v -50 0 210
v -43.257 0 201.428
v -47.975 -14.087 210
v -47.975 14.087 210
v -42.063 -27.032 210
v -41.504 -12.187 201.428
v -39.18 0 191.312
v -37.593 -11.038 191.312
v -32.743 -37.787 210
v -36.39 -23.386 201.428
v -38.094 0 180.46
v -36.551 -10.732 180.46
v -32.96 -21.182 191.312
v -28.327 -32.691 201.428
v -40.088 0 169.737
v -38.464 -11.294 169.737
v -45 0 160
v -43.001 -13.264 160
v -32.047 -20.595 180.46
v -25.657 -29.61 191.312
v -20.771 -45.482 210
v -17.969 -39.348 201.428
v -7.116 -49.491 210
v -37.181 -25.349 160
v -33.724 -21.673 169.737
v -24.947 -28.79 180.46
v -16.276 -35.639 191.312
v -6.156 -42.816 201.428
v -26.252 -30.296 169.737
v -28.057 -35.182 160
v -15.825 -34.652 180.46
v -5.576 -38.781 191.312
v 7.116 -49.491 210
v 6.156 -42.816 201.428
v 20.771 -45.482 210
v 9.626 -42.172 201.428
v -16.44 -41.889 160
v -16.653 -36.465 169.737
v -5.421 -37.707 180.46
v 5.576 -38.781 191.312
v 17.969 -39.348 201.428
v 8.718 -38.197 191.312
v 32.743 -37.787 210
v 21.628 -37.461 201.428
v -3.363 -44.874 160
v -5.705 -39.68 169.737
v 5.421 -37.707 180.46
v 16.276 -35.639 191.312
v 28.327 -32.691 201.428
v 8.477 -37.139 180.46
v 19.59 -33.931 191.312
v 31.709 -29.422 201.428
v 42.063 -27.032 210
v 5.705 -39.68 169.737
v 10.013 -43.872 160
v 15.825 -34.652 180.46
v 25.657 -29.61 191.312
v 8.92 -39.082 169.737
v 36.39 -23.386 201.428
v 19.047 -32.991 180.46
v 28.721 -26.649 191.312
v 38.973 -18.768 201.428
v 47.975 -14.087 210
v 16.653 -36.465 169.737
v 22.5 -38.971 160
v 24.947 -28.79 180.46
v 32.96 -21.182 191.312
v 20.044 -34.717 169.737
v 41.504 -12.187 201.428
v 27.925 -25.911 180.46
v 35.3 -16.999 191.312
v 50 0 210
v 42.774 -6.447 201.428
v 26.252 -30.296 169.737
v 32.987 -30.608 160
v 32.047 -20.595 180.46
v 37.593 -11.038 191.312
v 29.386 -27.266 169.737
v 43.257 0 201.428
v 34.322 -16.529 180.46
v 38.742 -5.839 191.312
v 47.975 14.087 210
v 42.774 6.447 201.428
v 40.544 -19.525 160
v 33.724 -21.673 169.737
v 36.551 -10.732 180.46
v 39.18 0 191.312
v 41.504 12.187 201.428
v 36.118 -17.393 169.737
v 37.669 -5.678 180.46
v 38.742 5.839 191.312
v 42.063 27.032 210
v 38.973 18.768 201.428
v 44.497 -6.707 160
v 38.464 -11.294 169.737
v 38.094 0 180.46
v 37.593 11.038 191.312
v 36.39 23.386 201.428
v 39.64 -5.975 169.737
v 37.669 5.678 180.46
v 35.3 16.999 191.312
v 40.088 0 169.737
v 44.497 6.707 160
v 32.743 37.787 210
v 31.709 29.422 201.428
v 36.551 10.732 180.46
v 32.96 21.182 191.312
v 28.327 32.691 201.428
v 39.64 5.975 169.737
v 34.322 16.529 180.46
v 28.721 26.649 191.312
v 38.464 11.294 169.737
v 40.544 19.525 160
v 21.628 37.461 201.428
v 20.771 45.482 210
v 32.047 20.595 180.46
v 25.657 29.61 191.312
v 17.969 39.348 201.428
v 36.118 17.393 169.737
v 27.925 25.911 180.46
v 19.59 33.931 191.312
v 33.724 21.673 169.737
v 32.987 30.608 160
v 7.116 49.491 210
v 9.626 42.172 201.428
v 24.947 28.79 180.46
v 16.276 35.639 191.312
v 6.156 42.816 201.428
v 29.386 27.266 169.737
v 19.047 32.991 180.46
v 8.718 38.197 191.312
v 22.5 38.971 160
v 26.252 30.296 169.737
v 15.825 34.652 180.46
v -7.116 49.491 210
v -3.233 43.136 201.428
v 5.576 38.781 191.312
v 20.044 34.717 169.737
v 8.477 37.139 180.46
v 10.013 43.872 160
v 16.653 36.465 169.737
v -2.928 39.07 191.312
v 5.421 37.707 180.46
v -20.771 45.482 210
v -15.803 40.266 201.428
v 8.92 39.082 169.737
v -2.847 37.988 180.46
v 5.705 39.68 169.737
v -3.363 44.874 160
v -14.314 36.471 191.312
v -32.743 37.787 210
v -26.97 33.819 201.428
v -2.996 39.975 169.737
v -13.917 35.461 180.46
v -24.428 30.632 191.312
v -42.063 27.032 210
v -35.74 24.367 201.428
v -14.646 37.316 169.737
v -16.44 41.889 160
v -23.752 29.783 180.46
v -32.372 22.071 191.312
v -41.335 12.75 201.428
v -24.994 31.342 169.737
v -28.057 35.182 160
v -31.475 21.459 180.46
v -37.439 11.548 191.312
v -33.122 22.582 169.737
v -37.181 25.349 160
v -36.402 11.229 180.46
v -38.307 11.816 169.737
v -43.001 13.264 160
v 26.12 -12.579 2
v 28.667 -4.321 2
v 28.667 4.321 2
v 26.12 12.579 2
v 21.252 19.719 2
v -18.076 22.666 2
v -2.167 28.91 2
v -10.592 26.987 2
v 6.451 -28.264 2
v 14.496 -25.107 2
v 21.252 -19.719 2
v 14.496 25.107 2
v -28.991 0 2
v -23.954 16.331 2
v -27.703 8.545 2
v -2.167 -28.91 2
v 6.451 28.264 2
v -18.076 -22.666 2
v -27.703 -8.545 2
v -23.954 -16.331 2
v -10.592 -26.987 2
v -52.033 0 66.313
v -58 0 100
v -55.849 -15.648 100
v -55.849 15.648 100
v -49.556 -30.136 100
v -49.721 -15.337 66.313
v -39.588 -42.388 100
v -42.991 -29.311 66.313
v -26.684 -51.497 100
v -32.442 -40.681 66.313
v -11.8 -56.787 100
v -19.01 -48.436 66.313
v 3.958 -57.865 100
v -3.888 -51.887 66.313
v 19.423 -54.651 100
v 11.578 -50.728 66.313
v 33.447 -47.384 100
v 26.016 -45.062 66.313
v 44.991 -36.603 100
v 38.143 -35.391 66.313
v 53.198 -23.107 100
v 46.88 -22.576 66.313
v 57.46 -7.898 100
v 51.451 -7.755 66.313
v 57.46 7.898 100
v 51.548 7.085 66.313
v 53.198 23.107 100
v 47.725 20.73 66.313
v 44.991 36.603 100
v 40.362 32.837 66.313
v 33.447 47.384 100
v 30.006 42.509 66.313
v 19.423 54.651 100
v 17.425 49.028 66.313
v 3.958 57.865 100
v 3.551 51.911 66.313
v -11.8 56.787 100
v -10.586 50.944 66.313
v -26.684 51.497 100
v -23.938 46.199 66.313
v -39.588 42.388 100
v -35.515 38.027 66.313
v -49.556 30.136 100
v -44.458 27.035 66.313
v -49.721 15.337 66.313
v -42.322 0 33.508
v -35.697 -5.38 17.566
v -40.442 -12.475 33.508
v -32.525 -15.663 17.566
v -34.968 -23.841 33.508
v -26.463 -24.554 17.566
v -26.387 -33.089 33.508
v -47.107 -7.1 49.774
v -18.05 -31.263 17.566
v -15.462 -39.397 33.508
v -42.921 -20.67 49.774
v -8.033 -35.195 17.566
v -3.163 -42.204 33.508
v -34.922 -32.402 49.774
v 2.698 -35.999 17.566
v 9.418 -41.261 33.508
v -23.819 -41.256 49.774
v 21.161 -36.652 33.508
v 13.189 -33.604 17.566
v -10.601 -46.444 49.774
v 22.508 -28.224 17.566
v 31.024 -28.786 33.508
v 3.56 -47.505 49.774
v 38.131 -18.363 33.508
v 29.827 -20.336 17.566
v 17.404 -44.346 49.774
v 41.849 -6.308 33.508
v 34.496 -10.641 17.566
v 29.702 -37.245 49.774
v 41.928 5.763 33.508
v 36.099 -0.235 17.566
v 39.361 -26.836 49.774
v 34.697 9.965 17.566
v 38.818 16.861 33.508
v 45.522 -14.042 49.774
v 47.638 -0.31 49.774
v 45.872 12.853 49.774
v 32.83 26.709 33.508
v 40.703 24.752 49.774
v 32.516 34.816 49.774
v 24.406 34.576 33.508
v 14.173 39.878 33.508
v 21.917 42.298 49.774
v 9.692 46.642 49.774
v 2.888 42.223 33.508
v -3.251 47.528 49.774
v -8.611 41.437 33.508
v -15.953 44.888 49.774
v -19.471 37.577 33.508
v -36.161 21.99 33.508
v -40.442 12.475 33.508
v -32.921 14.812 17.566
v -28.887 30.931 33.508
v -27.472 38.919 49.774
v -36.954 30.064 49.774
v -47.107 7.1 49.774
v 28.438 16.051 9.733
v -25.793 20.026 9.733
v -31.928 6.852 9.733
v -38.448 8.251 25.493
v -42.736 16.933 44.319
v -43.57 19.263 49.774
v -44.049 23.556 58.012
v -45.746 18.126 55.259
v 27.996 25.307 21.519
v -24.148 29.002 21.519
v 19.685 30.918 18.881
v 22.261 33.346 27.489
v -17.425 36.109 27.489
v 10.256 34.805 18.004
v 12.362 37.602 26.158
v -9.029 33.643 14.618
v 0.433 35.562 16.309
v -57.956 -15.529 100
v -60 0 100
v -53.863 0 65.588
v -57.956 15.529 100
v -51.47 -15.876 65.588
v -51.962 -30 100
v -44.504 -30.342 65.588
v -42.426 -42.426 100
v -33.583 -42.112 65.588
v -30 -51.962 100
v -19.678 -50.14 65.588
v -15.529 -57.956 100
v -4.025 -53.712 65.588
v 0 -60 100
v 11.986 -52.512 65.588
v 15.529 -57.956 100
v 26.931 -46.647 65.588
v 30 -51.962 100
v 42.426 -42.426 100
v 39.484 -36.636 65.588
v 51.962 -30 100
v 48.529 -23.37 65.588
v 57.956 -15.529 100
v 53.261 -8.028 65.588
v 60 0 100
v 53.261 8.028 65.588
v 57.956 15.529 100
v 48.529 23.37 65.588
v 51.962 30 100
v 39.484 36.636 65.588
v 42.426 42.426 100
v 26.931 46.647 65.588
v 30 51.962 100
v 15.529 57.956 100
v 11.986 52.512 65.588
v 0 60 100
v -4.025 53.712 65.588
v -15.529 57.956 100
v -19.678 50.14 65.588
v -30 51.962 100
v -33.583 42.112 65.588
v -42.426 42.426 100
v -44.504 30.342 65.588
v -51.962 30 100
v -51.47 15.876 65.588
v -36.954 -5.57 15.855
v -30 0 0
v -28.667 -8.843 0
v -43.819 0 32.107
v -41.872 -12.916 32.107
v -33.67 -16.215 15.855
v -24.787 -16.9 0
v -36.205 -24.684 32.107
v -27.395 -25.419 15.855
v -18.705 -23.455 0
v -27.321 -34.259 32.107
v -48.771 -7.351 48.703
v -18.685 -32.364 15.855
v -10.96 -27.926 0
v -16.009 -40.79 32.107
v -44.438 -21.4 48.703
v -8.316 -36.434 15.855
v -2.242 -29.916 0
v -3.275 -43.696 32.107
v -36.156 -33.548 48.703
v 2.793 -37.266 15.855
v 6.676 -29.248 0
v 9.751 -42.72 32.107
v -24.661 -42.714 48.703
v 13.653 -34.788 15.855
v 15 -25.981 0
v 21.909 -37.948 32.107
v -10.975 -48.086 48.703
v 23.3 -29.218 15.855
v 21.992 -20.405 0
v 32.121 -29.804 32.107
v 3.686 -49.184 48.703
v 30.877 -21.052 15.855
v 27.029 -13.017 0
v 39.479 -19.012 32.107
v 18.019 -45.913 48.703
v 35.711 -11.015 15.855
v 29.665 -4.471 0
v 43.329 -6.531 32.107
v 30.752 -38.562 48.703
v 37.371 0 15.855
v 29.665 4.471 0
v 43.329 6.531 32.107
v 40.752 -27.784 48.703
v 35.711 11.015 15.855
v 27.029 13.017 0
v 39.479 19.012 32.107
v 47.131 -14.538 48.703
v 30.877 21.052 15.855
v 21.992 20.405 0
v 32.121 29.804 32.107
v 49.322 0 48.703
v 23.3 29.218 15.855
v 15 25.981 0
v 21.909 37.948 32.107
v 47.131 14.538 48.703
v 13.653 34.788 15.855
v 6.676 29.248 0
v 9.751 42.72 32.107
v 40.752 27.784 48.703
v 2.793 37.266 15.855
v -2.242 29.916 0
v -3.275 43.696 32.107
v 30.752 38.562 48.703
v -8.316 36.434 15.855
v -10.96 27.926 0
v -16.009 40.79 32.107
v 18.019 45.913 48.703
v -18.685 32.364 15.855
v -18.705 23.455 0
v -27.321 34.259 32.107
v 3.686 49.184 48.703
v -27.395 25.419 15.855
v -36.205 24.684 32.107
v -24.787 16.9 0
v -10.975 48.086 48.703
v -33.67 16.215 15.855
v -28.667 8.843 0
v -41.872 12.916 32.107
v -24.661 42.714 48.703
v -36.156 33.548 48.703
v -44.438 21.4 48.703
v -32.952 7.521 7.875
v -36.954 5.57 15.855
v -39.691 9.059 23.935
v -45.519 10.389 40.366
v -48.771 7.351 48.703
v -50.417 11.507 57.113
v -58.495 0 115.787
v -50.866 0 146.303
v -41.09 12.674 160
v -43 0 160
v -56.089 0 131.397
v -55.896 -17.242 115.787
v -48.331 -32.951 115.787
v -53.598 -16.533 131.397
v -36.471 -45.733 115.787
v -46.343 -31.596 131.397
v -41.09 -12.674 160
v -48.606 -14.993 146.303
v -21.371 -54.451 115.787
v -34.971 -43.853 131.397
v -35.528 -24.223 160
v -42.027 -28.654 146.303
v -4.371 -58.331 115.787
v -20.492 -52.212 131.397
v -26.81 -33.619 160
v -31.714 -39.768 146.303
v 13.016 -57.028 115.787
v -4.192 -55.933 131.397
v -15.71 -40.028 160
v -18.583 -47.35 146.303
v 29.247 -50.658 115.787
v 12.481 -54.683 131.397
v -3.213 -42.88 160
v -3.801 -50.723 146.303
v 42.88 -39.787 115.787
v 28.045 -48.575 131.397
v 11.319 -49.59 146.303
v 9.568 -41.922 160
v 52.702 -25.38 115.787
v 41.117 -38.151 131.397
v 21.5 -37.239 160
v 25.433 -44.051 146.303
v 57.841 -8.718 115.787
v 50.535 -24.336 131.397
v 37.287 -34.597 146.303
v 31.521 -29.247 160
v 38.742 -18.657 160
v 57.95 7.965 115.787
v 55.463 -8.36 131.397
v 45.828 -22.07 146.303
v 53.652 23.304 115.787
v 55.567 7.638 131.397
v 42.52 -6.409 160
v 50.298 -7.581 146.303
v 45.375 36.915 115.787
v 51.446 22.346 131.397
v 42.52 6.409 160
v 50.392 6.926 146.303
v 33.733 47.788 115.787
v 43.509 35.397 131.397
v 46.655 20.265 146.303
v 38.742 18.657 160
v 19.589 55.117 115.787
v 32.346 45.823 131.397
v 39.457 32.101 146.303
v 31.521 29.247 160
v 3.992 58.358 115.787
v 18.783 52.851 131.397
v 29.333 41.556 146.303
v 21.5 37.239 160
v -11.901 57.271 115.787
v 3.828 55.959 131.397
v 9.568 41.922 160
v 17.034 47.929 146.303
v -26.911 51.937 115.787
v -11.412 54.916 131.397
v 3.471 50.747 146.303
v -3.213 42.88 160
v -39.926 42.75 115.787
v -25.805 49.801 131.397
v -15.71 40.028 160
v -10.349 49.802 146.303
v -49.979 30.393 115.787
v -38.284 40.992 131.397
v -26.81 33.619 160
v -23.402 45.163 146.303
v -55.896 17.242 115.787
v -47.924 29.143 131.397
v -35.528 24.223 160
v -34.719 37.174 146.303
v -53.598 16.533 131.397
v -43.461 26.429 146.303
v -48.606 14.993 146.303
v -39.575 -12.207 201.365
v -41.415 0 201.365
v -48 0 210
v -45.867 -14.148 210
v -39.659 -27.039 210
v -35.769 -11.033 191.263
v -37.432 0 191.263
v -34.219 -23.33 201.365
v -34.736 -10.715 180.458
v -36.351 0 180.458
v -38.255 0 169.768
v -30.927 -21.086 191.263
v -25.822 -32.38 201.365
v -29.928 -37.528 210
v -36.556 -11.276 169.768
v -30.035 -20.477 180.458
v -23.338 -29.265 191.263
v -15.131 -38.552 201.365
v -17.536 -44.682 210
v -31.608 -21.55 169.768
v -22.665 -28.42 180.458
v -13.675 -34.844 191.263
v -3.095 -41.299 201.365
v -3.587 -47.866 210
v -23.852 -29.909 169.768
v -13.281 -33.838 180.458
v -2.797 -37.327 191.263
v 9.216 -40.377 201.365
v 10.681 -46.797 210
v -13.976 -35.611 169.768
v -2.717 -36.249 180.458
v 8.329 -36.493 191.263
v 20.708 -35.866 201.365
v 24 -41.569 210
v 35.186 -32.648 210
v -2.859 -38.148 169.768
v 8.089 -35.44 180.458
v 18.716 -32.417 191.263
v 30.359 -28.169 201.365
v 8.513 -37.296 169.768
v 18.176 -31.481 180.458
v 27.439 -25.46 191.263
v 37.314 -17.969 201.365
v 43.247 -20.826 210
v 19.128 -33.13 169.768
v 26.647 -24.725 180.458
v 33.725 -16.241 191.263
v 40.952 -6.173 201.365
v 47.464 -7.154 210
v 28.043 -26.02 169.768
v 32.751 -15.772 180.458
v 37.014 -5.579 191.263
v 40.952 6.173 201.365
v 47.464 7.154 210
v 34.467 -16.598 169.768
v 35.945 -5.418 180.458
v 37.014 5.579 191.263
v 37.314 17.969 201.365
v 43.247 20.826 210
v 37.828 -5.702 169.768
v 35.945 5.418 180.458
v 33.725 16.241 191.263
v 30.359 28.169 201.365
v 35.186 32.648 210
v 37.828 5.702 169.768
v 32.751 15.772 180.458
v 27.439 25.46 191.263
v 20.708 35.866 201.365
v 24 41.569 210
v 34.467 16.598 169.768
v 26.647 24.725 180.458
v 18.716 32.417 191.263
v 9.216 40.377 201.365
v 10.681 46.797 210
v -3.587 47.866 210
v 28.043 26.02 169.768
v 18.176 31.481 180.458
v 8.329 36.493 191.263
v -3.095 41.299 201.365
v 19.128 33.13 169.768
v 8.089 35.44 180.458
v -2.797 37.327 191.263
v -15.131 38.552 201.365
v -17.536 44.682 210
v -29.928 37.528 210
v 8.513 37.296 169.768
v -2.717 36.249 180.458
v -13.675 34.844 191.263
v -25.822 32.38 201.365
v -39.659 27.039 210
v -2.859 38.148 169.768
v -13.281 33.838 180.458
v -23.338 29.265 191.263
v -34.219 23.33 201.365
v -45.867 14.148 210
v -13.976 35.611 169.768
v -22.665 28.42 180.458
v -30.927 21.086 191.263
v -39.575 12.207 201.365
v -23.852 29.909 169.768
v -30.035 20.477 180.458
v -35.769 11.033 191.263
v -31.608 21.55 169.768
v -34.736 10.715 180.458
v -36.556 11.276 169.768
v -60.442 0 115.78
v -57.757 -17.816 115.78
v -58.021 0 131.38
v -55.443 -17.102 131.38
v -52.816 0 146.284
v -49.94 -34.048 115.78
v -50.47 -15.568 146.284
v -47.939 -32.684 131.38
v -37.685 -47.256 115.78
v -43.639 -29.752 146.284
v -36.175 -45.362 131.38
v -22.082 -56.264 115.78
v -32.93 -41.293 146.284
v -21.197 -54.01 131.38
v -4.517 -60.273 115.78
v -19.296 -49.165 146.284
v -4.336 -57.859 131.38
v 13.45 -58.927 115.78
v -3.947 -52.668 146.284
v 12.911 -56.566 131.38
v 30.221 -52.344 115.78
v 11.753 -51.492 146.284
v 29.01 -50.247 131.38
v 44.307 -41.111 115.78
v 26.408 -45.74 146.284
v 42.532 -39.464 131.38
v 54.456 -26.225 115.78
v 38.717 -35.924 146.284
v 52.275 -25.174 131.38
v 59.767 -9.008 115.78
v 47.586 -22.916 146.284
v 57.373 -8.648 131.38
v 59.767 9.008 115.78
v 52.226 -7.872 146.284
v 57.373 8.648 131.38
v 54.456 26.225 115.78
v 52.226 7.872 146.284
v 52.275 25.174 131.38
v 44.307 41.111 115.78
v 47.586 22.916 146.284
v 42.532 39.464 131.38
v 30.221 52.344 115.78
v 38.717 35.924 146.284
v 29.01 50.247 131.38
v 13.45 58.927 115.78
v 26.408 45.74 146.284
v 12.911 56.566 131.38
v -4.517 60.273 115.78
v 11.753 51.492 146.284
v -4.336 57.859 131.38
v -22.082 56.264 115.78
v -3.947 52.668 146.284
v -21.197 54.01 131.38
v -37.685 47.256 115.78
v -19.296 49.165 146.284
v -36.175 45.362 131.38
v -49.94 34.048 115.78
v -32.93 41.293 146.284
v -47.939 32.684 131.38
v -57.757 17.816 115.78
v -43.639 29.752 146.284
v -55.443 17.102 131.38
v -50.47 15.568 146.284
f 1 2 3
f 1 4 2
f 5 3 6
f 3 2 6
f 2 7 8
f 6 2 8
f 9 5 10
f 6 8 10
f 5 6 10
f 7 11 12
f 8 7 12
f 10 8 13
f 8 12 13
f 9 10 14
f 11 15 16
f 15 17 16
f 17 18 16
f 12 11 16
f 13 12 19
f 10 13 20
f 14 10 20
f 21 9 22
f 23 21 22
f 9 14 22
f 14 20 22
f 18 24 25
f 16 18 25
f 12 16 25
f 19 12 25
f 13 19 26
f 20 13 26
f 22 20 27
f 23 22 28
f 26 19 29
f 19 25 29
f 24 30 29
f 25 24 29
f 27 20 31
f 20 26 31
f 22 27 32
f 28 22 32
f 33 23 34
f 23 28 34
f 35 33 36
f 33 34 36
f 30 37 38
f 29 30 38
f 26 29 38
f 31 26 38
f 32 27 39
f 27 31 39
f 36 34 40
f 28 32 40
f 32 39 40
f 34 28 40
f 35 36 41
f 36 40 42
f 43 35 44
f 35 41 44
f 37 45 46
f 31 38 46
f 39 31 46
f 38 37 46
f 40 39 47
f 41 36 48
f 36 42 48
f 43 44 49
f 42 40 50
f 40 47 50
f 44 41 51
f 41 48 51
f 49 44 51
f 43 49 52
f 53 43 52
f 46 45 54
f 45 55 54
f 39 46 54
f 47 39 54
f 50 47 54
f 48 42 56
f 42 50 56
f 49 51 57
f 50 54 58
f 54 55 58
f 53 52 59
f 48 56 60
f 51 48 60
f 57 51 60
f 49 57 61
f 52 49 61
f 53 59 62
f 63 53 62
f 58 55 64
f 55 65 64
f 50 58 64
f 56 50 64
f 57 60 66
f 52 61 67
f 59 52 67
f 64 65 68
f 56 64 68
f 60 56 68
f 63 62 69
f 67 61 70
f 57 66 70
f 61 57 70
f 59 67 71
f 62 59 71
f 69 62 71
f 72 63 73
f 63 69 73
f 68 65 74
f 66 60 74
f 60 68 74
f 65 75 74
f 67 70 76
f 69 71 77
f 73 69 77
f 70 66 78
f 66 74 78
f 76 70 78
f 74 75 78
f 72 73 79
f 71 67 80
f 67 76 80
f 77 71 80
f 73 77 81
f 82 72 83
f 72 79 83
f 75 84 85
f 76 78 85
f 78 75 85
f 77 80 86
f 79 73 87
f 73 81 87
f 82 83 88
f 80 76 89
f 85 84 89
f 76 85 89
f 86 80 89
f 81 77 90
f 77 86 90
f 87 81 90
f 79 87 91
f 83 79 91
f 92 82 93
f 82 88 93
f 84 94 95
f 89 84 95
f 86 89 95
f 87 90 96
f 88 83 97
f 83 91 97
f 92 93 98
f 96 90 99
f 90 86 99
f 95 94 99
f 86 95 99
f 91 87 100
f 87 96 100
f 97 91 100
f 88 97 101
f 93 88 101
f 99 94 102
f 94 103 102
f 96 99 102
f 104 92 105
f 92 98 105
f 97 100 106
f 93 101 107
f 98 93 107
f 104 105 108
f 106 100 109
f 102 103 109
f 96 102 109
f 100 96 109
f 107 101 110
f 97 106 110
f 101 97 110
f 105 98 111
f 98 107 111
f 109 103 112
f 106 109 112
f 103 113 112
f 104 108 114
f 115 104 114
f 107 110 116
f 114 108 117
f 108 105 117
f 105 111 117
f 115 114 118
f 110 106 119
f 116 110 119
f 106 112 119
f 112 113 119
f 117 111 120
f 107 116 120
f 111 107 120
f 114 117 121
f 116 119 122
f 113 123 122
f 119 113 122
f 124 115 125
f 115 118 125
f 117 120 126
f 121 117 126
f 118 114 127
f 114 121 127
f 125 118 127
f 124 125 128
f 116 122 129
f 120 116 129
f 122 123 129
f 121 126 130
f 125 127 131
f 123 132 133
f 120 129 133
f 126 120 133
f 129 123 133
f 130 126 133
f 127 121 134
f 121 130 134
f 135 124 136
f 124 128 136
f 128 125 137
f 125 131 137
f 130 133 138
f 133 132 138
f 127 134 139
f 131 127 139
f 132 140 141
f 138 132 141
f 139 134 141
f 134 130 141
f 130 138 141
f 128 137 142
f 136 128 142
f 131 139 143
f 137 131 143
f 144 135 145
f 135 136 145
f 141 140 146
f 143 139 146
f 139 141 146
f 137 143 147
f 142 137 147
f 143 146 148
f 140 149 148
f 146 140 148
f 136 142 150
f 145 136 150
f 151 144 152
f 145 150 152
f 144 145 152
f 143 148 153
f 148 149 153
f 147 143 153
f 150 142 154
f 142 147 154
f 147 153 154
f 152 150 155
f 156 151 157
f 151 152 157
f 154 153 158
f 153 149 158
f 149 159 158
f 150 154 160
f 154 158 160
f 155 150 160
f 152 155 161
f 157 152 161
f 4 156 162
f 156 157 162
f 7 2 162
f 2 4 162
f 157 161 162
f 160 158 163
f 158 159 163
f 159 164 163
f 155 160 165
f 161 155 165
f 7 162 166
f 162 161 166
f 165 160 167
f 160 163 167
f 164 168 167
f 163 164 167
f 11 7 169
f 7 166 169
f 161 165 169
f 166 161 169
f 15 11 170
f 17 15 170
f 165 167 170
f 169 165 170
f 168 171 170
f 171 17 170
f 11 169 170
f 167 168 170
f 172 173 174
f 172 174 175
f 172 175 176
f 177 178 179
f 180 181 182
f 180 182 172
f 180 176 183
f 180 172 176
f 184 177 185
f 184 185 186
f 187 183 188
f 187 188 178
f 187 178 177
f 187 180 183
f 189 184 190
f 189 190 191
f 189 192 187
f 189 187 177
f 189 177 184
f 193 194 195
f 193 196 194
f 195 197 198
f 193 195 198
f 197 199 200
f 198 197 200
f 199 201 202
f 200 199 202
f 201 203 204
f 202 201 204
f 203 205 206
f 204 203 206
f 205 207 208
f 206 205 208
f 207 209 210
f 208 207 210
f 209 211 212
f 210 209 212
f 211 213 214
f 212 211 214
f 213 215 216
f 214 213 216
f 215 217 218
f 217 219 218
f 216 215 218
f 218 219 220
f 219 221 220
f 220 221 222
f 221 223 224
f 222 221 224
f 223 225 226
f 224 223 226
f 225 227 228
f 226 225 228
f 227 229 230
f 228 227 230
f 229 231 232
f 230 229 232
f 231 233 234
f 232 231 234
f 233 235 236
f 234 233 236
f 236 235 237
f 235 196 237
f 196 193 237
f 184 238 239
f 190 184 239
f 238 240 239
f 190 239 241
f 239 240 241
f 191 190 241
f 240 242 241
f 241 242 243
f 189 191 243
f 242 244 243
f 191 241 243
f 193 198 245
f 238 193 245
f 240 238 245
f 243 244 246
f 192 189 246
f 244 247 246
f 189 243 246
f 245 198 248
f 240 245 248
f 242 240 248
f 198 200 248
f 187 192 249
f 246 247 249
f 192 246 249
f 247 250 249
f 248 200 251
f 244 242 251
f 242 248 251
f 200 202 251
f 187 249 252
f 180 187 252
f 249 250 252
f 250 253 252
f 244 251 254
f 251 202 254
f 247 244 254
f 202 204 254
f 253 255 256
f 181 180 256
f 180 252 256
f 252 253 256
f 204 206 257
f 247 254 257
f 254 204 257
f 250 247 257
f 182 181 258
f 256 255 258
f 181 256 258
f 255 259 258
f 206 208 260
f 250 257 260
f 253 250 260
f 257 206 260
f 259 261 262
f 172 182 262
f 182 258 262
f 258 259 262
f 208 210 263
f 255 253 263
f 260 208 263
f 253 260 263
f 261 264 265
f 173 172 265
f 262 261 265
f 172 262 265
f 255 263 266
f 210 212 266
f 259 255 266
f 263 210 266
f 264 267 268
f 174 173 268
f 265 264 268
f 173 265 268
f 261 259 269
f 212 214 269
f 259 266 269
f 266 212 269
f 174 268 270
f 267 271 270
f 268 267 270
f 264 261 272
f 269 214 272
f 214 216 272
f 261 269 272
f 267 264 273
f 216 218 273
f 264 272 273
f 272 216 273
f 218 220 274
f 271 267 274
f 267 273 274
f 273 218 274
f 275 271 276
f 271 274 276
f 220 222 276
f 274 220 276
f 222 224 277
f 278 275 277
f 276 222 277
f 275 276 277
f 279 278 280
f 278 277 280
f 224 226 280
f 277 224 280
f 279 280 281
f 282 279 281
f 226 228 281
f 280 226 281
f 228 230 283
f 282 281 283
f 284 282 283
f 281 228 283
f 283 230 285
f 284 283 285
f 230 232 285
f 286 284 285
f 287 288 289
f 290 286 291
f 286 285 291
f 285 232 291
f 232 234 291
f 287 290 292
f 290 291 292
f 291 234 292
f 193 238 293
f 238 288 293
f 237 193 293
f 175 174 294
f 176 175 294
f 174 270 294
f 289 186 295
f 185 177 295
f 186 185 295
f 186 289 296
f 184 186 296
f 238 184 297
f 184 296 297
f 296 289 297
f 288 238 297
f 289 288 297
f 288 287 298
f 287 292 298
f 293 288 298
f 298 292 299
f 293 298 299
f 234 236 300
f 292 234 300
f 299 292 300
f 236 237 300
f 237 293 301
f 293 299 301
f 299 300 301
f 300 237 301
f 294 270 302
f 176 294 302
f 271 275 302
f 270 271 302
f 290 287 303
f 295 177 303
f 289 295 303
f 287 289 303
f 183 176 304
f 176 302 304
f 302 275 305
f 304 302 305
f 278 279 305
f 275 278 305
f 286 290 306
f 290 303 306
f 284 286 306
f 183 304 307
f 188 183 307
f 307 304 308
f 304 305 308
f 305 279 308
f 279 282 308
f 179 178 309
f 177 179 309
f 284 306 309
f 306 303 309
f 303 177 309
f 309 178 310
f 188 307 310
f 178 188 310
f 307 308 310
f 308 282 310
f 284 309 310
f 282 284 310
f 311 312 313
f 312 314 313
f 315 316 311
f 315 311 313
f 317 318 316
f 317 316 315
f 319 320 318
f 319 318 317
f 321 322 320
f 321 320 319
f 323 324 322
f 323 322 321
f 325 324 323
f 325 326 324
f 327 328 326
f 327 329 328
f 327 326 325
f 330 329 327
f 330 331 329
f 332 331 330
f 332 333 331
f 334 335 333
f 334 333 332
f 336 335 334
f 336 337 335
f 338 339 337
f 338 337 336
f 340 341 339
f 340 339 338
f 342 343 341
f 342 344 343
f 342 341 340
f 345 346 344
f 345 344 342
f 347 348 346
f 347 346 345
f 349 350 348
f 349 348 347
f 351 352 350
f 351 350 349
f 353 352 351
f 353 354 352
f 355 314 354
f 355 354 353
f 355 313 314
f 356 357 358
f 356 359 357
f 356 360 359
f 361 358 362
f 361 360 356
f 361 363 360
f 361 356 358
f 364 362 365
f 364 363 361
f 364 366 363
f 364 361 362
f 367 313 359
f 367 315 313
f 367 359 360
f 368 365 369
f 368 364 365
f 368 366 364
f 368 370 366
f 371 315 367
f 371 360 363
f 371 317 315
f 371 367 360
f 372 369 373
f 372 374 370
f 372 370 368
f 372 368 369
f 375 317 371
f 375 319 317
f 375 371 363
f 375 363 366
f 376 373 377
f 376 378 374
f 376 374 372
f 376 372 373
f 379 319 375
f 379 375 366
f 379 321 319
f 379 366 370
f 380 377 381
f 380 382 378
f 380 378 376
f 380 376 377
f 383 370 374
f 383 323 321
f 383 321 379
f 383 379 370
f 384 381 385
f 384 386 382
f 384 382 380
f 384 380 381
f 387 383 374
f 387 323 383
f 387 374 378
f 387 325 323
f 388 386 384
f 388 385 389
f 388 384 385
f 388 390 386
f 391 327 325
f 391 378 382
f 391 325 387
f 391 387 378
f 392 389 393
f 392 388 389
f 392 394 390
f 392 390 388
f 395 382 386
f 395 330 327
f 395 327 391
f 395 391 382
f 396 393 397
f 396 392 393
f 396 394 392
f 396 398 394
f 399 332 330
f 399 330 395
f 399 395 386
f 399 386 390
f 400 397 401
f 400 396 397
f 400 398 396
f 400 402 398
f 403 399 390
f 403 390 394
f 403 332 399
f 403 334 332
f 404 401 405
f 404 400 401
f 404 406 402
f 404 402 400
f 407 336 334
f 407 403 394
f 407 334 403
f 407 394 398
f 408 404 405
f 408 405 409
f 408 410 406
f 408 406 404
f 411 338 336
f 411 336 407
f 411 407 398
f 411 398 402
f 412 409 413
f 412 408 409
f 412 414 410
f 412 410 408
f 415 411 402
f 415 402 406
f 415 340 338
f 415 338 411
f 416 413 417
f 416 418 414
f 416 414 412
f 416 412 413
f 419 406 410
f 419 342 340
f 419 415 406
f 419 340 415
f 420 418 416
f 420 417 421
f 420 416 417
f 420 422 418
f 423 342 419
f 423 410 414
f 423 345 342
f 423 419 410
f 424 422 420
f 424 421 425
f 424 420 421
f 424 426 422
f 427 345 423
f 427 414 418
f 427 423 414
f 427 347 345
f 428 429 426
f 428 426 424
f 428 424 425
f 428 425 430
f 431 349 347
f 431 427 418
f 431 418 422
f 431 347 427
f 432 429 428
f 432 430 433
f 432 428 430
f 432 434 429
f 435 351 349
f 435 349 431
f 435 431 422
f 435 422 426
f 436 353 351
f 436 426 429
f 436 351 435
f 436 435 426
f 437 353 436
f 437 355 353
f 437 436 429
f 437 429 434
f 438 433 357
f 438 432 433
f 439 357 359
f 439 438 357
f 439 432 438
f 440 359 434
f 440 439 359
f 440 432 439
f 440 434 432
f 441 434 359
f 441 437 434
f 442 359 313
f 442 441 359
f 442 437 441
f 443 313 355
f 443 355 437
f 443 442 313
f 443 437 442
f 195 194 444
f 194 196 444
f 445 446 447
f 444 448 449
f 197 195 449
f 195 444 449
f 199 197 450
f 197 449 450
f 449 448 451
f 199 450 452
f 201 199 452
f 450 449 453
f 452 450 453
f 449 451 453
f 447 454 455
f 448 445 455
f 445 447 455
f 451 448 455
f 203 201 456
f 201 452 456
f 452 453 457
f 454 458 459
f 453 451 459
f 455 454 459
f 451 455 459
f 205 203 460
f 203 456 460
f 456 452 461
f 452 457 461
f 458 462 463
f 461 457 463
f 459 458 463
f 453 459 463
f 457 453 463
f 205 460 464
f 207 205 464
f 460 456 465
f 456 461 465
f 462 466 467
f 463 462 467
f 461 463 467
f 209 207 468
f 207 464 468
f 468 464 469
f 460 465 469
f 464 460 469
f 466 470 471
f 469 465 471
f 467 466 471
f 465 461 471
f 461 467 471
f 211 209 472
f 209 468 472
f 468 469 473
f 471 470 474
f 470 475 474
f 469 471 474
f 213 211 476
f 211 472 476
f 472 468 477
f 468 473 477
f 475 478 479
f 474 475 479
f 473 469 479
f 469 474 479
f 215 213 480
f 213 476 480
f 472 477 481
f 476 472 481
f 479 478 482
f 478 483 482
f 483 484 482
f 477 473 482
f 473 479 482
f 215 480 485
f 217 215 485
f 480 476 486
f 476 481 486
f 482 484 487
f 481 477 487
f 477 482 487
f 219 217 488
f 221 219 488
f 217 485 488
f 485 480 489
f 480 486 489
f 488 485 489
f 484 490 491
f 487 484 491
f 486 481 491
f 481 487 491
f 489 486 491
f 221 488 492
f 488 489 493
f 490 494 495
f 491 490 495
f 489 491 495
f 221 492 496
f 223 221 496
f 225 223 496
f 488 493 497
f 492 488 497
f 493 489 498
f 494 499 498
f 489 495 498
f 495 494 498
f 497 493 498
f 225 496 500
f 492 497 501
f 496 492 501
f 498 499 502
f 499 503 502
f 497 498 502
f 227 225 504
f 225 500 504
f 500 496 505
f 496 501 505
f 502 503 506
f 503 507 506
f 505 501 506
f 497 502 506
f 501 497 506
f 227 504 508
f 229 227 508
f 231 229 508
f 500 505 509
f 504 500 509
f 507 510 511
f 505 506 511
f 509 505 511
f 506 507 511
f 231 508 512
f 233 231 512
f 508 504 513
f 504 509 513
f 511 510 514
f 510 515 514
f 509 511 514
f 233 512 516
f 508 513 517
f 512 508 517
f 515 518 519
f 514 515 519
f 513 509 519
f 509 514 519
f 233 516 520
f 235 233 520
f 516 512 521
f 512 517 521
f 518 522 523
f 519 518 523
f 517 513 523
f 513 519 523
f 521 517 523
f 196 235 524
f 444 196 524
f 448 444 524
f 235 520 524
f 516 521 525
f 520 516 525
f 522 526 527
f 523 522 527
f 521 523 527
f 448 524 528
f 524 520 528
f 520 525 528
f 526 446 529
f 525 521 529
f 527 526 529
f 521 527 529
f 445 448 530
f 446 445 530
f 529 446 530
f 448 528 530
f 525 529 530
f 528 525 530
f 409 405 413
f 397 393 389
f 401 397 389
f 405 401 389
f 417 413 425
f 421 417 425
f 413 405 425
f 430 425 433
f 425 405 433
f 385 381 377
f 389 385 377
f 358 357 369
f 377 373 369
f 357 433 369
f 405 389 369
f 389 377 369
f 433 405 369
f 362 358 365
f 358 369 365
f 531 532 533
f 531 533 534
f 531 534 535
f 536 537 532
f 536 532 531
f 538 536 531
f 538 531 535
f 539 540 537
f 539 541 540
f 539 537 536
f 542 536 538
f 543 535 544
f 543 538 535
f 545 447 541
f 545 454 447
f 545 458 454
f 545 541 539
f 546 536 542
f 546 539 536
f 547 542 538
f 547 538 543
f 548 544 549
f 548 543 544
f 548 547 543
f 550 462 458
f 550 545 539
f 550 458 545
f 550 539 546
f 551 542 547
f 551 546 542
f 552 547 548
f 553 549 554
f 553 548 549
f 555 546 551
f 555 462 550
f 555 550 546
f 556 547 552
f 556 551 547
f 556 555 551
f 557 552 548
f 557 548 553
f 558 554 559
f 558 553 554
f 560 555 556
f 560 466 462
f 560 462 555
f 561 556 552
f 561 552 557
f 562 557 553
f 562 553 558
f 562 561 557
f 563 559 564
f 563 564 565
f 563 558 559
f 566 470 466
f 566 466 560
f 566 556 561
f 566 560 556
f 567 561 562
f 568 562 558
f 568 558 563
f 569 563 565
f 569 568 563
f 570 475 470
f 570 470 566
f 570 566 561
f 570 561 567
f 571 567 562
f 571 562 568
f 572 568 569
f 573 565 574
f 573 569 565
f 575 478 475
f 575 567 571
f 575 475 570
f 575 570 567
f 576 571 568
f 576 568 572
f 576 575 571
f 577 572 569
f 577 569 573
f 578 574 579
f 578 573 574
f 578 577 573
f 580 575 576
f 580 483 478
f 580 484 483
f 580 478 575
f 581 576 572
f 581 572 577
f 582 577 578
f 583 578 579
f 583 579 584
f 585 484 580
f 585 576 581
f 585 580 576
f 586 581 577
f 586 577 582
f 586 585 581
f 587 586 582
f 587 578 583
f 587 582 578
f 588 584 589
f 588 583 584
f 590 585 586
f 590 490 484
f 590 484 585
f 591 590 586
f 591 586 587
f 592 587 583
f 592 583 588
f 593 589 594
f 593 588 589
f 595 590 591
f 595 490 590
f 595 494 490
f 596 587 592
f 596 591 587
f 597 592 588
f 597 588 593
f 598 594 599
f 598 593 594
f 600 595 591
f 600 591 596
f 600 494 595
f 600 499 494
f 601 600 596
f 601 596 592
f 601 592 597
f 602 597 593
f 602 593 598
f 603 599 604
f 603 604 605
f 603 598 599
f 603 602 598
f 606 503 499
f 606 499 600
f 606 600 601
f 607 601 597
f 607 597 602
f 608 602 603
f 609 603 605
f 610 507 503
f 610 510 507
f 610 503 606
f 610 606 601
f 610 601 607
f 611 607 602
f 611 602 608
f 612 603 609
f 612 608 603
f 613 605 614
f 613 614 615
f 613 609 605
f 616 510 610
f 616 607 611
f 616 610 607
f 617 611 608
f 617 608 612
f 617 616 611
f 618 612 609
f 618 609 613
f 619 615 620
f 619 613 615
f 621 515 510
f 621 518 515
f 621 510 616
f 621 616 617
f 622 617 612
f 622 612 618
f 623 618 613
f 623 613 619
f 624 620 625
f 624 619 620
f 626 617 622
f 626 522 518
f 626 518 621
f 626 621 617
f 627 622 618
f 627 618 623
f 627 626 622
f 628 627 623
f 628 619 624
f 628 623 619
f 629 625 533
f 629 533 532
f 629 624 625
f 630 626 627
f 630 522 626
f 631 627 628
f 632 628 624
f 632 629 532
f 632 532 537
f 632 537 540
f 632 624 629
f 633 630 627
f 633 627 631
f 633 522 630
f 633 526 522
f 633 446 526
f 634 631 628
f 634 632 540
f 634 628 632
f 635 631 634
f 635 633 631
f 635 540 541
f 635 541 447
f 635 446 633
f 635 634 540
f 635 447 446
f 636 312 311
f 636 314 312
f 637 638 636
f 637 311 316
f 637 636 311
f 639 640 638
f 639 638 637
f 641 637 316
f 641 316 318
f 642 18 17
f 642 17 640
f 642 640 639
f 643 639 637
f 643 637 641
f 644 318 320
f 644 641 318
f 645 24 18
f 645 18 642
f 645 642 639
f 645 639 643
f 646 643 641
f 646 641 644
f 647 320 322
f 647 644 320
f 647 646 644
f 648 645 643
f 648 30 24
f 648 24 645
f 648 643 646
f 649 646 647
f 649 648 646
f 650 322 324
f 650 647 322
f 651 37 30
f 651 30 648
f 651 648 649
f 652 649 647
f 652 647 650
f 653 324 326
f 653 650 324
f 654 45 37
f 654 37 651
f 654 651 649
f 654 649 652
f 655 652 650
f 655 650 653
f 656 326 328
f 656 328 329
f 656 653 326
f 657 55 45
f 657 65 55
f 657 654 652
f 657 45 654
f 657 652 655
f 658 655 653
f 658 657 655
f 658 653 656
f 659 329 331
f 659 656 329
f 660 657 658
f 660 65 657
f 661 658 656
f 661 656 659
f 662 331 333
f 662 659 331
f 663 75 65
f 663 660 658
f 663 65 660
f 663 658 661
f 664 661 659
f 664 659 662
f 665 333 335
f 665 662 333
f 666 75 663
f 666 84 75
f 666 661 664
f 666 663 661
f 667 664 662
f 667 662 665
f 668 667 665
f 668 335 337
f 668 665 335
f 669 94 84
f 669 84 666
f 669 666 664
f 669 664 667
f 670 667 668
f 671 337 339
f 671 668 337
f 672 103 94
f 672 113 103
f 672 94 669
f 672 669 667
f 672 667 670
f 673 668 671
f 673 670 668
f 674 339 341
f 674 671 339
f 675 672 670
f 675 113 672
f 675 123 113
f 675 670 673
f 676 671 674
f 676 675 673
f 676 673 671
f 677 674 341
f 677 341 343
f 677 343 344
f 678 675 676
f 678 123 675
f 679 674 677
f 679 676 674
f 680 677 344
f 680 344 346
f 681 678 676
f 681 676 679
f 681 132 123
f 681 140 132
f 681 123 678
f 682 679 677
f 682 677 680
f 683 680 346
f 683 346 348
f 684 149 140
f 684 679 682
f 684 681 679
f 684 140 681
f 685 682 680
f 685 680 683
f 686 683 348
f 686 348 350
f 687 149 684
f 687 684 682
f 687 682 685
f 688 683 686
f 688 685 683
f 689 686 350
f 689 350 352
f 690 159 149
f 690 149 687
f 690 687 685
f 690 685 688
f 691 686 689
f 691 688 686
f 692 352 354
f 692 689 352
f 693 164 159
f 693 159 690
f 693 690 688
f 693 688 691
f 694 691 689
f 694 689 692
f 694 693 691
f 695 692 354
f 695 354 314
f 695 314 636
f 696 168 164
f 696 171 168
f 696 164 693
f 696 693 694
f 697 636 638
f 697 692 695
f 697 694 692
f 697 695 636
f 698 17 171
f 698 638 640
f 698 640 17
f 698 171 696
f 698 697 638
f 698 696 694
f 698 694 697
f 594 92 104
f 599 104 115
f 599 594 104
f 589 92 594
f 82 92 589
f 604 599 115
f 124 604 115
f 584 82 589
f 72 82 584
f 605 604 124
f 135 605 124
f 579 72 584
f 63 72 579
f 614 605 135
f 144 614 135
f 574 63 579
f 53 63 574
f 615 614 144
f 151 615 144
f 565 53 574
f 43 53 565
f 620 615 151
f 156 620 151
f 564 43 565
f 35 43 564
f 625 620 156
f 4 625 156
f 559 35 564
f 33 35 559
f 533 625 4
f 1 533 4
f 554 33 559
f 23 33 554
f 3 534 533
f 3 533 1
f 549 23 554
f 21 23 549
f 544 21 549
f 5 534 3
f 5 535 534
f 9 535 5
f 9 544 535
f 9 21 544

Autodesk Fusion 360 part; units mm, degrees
sketch "Sketch1" plane through (0, 0, 0) normal (0, 1, 0) x (1, 0, 0)
  line L0 (0, 0) -> (-30, 0)
  line L1 (0, -100) -> (-60, -100)
  line L2 (0, -160) -> (-45, -160)
  line L3 (0, -210) -> (-50, -210)
  arc A0 (-50, -210) -> (-45, -160) centre (-76.6667, -182.0833) ccw
  arc A1 (-60, -100) -> (-45, -160) centre (26.25, -110.3125) ccw
  arc A2 (-30, 0) -> (-60, -100) centre (242.0482, -136.1145) ccw
  line L4 (0, -210) -> (-48, -210)
  line L5 (0, -160) -> (-43, -160)
  line L6 (0, -100) -> (-58, -100)
  line L7 (0, 0) -> (-28, 0)
  arc A3 (-28.9913, -2) -> (-58, -100) centre (244.2, -136.16) ccw
  arc A4 (-58, -100) -> (-43, -160) centre (27.2134, -110.5716) ccw
  arc A5 (-48, -210) -> (-43, -160) centre (-75.8013, -181.9699) ccw
  line L8 (0, 0) -> (0, -2)
  line L9 (0, -2) -> (-28.9913, -2)
  dimension "d1" = 30
  dimension "d2" = 100
  dimension "d3" = 60
  dimension "d4" = 60
  dimension "d5" = 45
  dimension "d6" = 50
  dimension "d7" = 50
  dimension "d9" = 48
  dimension "d10" = 43
  dimension "d11" = 58
  dimension "d12" = 28
revolve "Revolve1" add sketch "Sketch1" angle 360 about axis through (0, 0, 1.75) along (0, 0, 1) second angle 360
